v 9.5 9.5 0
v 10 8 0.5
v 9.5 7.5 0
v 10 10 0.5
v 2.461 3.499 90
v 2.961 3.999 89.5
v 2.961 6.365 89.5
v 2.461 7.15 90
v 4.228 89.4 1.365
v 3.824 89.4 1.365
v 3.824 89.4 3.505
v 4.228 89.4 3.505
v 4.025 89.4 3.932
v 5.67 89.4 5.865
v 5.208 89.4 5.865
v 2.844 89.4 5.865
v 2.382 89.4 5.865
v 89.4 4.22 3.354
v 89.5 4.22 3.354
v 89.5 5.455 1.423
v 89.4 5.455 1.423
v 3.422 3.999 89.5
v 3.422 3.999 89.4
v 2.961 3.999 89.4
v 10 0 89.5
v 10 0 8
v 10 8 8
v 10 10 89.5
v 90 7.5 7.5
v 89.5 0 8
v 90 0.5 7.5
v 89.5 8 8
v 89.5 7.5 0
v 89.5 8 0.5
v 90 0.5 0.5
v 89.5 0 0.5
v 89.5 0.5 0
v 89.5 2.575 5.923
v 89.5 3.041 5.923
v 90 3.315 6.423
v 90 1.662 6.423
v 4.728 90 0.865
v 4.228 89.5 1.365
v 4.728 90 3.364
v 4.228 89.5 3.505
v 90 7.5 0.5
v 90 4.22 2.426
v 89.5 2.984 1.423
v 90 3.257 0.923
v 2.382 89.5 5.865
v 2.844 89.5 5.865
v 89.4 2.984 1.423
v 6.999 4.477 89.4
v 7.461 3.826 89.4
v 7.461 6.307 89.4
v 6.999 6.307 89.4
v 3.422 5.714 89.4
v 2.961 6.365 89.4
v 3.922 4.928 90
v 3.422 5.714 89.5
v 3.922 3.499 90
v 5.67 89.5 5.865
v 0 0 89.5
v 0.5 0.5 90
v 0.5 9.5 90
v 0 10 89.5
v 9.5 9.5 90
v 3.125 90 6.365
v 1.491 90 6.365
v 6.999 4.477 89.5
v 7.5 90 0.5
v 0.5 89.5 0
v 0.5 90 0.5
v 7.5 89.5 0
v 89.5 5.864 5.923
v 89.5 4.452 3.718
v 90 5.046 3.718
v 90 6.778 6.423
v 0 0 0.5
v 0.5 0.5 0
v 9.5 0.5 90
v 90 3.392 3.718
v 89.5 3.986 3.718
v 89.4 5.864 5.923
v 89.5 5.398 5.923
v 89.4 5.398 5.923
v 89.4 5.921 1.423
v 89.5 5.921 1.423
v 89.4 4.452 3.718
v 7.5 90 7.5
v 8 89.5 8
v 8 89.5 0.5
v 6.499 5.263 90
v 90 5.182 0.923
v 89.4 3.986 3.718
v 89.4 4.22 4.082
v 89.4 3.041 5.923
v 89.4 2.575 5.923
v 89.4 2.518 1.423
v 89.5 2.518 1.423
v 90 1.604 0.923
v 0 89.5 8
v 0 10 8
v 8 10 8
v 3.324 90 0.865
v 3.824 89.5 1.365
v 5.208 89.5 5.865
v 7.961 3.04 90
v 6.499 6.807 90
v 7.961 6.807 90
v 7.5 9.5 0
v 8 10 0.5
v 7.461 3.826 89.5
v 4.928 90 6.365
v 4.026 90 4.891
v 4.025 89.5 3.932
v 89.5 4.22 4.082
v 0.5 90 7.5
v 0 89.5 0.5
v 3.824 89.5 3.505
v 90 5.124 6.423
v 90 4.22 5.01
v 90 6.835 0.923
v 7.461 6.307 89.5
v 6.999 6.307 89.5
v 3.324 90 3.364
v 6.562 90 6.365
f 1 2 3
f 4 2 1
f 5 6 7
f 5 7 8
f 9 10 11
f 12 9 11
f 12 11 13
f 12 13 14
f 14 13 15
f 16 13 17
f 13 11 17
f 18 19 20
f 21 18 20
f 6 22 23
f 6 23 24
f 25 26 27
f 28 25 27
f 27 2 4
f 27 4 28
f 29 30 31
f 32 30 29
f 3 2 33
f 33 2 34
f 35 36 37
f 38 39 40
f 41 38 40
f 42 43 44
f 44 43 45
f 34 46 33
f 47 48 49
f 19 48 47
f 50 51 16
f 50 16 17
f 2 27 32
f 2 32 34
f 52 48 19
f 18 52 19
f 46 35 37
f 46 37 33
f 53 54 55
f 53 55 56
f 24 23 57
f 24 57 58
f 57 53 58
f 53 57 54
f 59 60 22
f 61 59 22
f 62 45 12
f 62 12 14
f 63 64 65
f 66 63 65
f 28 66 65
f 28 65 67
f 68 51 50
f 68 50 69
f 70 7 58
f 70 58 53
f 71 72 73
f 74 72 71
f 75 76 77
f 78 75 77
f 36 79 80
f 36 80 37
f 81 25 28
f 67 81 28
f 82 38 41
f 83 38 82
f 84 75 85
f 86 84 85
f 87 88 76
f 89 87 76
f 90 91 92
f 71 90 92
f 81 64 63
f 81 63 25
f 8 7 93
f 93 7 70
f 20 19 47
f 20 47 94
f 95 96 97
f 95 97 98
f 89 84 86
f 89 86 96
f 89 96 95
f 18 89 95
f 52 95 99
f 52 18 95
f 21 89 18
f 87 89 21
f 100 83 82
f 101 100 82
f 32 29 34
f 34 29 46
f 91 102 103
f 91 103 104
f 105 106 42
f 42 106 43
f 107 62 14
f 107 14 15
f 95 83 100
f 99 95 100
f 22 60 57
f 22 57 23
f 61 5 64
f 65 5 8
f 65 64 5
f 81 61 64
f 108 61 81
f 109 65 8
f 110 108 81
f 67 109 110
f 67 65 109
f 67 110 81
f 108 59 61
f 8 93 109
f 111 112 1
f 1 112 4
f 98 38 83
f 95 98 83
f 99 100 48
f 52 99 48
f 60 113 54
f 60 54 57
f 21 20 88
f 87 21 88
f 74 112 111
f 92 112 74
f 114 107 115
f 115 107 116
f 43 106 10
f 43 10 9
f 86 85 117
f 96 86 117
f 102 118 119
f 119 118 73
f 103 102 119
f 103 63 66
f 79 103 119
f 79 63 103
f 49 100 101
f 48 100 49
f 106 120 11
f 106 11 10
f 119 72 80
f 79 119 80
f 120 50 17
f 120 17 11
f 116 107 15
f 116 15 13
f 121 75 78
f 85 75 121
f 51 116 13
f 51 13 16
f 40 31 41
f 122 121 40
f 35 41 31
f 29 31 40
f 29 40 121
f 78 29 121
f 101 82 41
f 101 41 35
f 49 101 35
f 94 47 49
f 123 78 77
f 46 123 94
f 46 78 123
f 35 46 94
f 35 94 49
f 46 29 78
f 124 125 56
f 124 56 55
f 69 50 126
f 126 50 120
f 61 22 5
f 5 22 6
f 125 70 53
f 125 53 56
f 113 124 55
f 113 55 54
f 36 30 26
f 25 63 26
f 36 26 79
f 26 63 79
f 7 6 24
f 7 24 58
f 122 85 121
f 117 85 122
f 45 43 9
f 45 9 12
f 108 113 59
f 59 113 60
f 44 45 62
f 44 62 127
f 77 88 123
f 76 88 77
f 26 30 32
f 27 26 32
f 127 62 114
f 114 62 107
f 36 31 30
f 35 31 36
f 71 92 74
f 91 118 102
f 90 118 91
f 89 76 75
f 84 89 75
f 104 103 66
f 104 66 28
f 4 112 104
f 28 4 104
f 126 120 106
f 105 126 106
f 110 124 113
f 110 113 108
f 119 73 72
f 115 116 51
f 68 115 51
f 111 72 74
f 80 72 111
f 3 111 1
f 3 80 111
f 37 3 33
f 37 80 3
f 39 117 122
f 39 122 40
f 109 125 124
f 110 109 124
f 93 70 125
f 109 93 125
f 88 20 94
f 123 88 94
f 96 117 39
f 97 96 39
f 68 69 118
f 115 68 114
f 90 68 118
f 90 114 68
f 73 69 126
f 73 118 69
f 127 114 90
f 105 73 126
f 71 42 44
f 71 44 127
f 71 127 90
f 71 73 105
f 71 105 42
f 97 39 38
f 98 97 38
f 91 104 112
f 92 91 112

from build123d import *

# Parameters (mm, degrees)
SKETCH1_W           = 10
SKETCH1_H           = 10
BOSS_EXTRUDE1_DEPTH = 90
SKETCH2_W           = 8
SKETCH2_H           = 8
BOSS_EXTRUDE2_DEPTH = 80
SKETCH3_W           = 8
SKETCH3_H           = 8
BOSS_EXTRUDE3_DEPTH = 80
CUT_EXTRUDE1_DEPTH  = 0.6
CUT_EXTRUDE2_DEPTH  = 0.6
CUT_EXTRUDE3_DEPTH  = 0.6
CHAMFER1_SIZE       = 0.5


with BuildPart() as part:
    # Sketch1 → Boss-Extrude1 (new body)
    with BuildSketch(Plane.XY):
        with Locations((5, 5)):
            Rectangle(SKETCH1_W, SKETCH1_H)
    extrude(amount=BOSS_EXTRUDE1_DEPTH)

    # Sketch2 → Boss-Extrude2 (add)
    with BuildSketch(Plane(origin=(10, 0, 0), x_dir=(0, 0, -1), z_dir=(1, 0, 0))):
        with Locations((-4, 4)):
            Rectangle(SKETCH2_W, SKETCH2_H)
    extrude(amount=BOSS_EXTRUDE2_DEPTH)

    # Sketch3 → Boss-Extrude3 (add)
    with BuildSketch(Plane(origin=(0, 10, 0), x_dir=(1, 0, 0), z_dir=(0, 1, 0))):
        with Locations((4, -4)):
            Rectangle(SKETCH3_W, SKETCH3_H)
    extrude(amount=BOSS_EXTRUDE3_DEPTH)

    # Sketch6 → Cut-Extrude1 (cut)
    with BuildSketch(Plane(origin=(90, 0, 0), x_dir=(0, 0, -1), z_dir=(1, 0, 0))):
        Polygon((-5.923065511, 5.863746423), (-5.923065511, 5.39770075), (-4.082320318, 4.219515654), (-5.923065511, 3.041330558), (-5.923065511, 2.575284885), (-3.718137626, 3.986042096), (-1.423065511, 2.517592577), (-1.423065511, 2.98363825), (-3.353954934, 4.219515654), (-1.423065511, 5.455393058), (-1.423065511, 5.921438731), (-3.718137626, 4.452087769), align=None)
    extrude(amount=-CUT_EXTRUDE1_DEPTH, mode=Mode.SUBTRACT)

    # Sketch7 → Cut-Extrude2 (cut)
    with BuildSketch(Plane(origin=(0, 90, 0), x_dir=(0, 0, -1), z_dir=(0, 1, 0))):
        Polygon((-5.865477289, -5.670481901), (-5.865477289, -5.208041997), (-3.931883539, -4.025349689), (-5.865477289, -2.844460266), (-5.865477289, -2.382020363), (-3.504599885, -3.824328055), (-1.365477289, -3.824328055), (-1.365477289, -4.228174209), (-3.504599885, -4.228174209), align=None)
    extrude(amount=-CUT_EXTRUDE2_DEPTH, mode=Mode.SUBTRACT)

    # Sketch8 → Cut-Extrude3 (cut)
    with BuildSketch(Plane.XY.offset(90)):
        Polygon((3.422101108, 3.999142166), (2.960562647, 3.999142166), (2.960562647, 6.364526781), (6.999024185, 4.476906589), (6.999024185, 6.306834473), (7.460562647, 6.306834473), (7.460562647, 3.826065243), (3.422101108, 5.713685435), align=None)
    extrude(amount=-CUT_EXTRUDE3_DEPTH, mode=Mode.SUBTRACT)

    # Chamfer1
    chamfer1_edges = [part.edges().sort_by_distance(p)[0] for p in [
        (5.441331878, 4.769875339, 90),
        (7.460562647, 5.066449858, 90),
        (7.229793416, 6.306834473, 90),
        (6.999024185, 5.391870531, 90),
        (4.979793416, 5.420716685, 90),
        (2.960562647, 5.181834473, 90),
        (3.191331878, 3.999142166, 90),
        (3.422101108, 4.8564138, 90),
        (5, 10, 90),
        (10, 5, 90),
        (5, 0, 90),
        (0, 5, 90),
        (4.026251132, 90, 1.365477289),
        (3.824328055, 90, 2.435038587),
        (3.103174209, 90, 4.685038587),
        (2.613240314, 90, 5.865477289),
        (3.434904978, 90, 4.898680414),
        (4.616695843, 90, 4.898680414),
        (5.439261949, 90, 5.865477289),
        (4.949328055, 90, 4.685038587),
        (4.228174209, 90, 2.435038587),
        (90, 5.630723587, 5.923065511),
        (90, 4.808608202, 5.002692915),
        (90, 3.630423106, 5.002692915),
        (90, 2.808307721, 5.923065511),
        (90, 3.28066349, 4.820601568),
        (90, 3.251817337, 2.570601568),
        (90, 2.750615413, 1.423065511),
        (90, 3.601576952, 2.388510222),
        (90, 4.837454356, 2.388510222),
        (90, 5.688415894, 1.423065511),
        (90, 5.18676325, 2.570601568),
        (90, 5.157917096, 4.820601568),
        (8, 90, 4),
        (4, 90, 8),
        (0, 90, 4),
        (90, 4, 8),
        (90, 8, 4),
        (90, 0, 4),
        (45, 0, 0),
        (90, 4, 0),
        (50, 8, 0),
        (10, 9, 0),
        (9, 10, 0),
        (8, 50, 0),
        (4, 90, 0),
        (0, 45, 0),
    ]]
    chamfer(chamfer1_edges, length=CHAMFER1_SIZE)


solid = part.part
